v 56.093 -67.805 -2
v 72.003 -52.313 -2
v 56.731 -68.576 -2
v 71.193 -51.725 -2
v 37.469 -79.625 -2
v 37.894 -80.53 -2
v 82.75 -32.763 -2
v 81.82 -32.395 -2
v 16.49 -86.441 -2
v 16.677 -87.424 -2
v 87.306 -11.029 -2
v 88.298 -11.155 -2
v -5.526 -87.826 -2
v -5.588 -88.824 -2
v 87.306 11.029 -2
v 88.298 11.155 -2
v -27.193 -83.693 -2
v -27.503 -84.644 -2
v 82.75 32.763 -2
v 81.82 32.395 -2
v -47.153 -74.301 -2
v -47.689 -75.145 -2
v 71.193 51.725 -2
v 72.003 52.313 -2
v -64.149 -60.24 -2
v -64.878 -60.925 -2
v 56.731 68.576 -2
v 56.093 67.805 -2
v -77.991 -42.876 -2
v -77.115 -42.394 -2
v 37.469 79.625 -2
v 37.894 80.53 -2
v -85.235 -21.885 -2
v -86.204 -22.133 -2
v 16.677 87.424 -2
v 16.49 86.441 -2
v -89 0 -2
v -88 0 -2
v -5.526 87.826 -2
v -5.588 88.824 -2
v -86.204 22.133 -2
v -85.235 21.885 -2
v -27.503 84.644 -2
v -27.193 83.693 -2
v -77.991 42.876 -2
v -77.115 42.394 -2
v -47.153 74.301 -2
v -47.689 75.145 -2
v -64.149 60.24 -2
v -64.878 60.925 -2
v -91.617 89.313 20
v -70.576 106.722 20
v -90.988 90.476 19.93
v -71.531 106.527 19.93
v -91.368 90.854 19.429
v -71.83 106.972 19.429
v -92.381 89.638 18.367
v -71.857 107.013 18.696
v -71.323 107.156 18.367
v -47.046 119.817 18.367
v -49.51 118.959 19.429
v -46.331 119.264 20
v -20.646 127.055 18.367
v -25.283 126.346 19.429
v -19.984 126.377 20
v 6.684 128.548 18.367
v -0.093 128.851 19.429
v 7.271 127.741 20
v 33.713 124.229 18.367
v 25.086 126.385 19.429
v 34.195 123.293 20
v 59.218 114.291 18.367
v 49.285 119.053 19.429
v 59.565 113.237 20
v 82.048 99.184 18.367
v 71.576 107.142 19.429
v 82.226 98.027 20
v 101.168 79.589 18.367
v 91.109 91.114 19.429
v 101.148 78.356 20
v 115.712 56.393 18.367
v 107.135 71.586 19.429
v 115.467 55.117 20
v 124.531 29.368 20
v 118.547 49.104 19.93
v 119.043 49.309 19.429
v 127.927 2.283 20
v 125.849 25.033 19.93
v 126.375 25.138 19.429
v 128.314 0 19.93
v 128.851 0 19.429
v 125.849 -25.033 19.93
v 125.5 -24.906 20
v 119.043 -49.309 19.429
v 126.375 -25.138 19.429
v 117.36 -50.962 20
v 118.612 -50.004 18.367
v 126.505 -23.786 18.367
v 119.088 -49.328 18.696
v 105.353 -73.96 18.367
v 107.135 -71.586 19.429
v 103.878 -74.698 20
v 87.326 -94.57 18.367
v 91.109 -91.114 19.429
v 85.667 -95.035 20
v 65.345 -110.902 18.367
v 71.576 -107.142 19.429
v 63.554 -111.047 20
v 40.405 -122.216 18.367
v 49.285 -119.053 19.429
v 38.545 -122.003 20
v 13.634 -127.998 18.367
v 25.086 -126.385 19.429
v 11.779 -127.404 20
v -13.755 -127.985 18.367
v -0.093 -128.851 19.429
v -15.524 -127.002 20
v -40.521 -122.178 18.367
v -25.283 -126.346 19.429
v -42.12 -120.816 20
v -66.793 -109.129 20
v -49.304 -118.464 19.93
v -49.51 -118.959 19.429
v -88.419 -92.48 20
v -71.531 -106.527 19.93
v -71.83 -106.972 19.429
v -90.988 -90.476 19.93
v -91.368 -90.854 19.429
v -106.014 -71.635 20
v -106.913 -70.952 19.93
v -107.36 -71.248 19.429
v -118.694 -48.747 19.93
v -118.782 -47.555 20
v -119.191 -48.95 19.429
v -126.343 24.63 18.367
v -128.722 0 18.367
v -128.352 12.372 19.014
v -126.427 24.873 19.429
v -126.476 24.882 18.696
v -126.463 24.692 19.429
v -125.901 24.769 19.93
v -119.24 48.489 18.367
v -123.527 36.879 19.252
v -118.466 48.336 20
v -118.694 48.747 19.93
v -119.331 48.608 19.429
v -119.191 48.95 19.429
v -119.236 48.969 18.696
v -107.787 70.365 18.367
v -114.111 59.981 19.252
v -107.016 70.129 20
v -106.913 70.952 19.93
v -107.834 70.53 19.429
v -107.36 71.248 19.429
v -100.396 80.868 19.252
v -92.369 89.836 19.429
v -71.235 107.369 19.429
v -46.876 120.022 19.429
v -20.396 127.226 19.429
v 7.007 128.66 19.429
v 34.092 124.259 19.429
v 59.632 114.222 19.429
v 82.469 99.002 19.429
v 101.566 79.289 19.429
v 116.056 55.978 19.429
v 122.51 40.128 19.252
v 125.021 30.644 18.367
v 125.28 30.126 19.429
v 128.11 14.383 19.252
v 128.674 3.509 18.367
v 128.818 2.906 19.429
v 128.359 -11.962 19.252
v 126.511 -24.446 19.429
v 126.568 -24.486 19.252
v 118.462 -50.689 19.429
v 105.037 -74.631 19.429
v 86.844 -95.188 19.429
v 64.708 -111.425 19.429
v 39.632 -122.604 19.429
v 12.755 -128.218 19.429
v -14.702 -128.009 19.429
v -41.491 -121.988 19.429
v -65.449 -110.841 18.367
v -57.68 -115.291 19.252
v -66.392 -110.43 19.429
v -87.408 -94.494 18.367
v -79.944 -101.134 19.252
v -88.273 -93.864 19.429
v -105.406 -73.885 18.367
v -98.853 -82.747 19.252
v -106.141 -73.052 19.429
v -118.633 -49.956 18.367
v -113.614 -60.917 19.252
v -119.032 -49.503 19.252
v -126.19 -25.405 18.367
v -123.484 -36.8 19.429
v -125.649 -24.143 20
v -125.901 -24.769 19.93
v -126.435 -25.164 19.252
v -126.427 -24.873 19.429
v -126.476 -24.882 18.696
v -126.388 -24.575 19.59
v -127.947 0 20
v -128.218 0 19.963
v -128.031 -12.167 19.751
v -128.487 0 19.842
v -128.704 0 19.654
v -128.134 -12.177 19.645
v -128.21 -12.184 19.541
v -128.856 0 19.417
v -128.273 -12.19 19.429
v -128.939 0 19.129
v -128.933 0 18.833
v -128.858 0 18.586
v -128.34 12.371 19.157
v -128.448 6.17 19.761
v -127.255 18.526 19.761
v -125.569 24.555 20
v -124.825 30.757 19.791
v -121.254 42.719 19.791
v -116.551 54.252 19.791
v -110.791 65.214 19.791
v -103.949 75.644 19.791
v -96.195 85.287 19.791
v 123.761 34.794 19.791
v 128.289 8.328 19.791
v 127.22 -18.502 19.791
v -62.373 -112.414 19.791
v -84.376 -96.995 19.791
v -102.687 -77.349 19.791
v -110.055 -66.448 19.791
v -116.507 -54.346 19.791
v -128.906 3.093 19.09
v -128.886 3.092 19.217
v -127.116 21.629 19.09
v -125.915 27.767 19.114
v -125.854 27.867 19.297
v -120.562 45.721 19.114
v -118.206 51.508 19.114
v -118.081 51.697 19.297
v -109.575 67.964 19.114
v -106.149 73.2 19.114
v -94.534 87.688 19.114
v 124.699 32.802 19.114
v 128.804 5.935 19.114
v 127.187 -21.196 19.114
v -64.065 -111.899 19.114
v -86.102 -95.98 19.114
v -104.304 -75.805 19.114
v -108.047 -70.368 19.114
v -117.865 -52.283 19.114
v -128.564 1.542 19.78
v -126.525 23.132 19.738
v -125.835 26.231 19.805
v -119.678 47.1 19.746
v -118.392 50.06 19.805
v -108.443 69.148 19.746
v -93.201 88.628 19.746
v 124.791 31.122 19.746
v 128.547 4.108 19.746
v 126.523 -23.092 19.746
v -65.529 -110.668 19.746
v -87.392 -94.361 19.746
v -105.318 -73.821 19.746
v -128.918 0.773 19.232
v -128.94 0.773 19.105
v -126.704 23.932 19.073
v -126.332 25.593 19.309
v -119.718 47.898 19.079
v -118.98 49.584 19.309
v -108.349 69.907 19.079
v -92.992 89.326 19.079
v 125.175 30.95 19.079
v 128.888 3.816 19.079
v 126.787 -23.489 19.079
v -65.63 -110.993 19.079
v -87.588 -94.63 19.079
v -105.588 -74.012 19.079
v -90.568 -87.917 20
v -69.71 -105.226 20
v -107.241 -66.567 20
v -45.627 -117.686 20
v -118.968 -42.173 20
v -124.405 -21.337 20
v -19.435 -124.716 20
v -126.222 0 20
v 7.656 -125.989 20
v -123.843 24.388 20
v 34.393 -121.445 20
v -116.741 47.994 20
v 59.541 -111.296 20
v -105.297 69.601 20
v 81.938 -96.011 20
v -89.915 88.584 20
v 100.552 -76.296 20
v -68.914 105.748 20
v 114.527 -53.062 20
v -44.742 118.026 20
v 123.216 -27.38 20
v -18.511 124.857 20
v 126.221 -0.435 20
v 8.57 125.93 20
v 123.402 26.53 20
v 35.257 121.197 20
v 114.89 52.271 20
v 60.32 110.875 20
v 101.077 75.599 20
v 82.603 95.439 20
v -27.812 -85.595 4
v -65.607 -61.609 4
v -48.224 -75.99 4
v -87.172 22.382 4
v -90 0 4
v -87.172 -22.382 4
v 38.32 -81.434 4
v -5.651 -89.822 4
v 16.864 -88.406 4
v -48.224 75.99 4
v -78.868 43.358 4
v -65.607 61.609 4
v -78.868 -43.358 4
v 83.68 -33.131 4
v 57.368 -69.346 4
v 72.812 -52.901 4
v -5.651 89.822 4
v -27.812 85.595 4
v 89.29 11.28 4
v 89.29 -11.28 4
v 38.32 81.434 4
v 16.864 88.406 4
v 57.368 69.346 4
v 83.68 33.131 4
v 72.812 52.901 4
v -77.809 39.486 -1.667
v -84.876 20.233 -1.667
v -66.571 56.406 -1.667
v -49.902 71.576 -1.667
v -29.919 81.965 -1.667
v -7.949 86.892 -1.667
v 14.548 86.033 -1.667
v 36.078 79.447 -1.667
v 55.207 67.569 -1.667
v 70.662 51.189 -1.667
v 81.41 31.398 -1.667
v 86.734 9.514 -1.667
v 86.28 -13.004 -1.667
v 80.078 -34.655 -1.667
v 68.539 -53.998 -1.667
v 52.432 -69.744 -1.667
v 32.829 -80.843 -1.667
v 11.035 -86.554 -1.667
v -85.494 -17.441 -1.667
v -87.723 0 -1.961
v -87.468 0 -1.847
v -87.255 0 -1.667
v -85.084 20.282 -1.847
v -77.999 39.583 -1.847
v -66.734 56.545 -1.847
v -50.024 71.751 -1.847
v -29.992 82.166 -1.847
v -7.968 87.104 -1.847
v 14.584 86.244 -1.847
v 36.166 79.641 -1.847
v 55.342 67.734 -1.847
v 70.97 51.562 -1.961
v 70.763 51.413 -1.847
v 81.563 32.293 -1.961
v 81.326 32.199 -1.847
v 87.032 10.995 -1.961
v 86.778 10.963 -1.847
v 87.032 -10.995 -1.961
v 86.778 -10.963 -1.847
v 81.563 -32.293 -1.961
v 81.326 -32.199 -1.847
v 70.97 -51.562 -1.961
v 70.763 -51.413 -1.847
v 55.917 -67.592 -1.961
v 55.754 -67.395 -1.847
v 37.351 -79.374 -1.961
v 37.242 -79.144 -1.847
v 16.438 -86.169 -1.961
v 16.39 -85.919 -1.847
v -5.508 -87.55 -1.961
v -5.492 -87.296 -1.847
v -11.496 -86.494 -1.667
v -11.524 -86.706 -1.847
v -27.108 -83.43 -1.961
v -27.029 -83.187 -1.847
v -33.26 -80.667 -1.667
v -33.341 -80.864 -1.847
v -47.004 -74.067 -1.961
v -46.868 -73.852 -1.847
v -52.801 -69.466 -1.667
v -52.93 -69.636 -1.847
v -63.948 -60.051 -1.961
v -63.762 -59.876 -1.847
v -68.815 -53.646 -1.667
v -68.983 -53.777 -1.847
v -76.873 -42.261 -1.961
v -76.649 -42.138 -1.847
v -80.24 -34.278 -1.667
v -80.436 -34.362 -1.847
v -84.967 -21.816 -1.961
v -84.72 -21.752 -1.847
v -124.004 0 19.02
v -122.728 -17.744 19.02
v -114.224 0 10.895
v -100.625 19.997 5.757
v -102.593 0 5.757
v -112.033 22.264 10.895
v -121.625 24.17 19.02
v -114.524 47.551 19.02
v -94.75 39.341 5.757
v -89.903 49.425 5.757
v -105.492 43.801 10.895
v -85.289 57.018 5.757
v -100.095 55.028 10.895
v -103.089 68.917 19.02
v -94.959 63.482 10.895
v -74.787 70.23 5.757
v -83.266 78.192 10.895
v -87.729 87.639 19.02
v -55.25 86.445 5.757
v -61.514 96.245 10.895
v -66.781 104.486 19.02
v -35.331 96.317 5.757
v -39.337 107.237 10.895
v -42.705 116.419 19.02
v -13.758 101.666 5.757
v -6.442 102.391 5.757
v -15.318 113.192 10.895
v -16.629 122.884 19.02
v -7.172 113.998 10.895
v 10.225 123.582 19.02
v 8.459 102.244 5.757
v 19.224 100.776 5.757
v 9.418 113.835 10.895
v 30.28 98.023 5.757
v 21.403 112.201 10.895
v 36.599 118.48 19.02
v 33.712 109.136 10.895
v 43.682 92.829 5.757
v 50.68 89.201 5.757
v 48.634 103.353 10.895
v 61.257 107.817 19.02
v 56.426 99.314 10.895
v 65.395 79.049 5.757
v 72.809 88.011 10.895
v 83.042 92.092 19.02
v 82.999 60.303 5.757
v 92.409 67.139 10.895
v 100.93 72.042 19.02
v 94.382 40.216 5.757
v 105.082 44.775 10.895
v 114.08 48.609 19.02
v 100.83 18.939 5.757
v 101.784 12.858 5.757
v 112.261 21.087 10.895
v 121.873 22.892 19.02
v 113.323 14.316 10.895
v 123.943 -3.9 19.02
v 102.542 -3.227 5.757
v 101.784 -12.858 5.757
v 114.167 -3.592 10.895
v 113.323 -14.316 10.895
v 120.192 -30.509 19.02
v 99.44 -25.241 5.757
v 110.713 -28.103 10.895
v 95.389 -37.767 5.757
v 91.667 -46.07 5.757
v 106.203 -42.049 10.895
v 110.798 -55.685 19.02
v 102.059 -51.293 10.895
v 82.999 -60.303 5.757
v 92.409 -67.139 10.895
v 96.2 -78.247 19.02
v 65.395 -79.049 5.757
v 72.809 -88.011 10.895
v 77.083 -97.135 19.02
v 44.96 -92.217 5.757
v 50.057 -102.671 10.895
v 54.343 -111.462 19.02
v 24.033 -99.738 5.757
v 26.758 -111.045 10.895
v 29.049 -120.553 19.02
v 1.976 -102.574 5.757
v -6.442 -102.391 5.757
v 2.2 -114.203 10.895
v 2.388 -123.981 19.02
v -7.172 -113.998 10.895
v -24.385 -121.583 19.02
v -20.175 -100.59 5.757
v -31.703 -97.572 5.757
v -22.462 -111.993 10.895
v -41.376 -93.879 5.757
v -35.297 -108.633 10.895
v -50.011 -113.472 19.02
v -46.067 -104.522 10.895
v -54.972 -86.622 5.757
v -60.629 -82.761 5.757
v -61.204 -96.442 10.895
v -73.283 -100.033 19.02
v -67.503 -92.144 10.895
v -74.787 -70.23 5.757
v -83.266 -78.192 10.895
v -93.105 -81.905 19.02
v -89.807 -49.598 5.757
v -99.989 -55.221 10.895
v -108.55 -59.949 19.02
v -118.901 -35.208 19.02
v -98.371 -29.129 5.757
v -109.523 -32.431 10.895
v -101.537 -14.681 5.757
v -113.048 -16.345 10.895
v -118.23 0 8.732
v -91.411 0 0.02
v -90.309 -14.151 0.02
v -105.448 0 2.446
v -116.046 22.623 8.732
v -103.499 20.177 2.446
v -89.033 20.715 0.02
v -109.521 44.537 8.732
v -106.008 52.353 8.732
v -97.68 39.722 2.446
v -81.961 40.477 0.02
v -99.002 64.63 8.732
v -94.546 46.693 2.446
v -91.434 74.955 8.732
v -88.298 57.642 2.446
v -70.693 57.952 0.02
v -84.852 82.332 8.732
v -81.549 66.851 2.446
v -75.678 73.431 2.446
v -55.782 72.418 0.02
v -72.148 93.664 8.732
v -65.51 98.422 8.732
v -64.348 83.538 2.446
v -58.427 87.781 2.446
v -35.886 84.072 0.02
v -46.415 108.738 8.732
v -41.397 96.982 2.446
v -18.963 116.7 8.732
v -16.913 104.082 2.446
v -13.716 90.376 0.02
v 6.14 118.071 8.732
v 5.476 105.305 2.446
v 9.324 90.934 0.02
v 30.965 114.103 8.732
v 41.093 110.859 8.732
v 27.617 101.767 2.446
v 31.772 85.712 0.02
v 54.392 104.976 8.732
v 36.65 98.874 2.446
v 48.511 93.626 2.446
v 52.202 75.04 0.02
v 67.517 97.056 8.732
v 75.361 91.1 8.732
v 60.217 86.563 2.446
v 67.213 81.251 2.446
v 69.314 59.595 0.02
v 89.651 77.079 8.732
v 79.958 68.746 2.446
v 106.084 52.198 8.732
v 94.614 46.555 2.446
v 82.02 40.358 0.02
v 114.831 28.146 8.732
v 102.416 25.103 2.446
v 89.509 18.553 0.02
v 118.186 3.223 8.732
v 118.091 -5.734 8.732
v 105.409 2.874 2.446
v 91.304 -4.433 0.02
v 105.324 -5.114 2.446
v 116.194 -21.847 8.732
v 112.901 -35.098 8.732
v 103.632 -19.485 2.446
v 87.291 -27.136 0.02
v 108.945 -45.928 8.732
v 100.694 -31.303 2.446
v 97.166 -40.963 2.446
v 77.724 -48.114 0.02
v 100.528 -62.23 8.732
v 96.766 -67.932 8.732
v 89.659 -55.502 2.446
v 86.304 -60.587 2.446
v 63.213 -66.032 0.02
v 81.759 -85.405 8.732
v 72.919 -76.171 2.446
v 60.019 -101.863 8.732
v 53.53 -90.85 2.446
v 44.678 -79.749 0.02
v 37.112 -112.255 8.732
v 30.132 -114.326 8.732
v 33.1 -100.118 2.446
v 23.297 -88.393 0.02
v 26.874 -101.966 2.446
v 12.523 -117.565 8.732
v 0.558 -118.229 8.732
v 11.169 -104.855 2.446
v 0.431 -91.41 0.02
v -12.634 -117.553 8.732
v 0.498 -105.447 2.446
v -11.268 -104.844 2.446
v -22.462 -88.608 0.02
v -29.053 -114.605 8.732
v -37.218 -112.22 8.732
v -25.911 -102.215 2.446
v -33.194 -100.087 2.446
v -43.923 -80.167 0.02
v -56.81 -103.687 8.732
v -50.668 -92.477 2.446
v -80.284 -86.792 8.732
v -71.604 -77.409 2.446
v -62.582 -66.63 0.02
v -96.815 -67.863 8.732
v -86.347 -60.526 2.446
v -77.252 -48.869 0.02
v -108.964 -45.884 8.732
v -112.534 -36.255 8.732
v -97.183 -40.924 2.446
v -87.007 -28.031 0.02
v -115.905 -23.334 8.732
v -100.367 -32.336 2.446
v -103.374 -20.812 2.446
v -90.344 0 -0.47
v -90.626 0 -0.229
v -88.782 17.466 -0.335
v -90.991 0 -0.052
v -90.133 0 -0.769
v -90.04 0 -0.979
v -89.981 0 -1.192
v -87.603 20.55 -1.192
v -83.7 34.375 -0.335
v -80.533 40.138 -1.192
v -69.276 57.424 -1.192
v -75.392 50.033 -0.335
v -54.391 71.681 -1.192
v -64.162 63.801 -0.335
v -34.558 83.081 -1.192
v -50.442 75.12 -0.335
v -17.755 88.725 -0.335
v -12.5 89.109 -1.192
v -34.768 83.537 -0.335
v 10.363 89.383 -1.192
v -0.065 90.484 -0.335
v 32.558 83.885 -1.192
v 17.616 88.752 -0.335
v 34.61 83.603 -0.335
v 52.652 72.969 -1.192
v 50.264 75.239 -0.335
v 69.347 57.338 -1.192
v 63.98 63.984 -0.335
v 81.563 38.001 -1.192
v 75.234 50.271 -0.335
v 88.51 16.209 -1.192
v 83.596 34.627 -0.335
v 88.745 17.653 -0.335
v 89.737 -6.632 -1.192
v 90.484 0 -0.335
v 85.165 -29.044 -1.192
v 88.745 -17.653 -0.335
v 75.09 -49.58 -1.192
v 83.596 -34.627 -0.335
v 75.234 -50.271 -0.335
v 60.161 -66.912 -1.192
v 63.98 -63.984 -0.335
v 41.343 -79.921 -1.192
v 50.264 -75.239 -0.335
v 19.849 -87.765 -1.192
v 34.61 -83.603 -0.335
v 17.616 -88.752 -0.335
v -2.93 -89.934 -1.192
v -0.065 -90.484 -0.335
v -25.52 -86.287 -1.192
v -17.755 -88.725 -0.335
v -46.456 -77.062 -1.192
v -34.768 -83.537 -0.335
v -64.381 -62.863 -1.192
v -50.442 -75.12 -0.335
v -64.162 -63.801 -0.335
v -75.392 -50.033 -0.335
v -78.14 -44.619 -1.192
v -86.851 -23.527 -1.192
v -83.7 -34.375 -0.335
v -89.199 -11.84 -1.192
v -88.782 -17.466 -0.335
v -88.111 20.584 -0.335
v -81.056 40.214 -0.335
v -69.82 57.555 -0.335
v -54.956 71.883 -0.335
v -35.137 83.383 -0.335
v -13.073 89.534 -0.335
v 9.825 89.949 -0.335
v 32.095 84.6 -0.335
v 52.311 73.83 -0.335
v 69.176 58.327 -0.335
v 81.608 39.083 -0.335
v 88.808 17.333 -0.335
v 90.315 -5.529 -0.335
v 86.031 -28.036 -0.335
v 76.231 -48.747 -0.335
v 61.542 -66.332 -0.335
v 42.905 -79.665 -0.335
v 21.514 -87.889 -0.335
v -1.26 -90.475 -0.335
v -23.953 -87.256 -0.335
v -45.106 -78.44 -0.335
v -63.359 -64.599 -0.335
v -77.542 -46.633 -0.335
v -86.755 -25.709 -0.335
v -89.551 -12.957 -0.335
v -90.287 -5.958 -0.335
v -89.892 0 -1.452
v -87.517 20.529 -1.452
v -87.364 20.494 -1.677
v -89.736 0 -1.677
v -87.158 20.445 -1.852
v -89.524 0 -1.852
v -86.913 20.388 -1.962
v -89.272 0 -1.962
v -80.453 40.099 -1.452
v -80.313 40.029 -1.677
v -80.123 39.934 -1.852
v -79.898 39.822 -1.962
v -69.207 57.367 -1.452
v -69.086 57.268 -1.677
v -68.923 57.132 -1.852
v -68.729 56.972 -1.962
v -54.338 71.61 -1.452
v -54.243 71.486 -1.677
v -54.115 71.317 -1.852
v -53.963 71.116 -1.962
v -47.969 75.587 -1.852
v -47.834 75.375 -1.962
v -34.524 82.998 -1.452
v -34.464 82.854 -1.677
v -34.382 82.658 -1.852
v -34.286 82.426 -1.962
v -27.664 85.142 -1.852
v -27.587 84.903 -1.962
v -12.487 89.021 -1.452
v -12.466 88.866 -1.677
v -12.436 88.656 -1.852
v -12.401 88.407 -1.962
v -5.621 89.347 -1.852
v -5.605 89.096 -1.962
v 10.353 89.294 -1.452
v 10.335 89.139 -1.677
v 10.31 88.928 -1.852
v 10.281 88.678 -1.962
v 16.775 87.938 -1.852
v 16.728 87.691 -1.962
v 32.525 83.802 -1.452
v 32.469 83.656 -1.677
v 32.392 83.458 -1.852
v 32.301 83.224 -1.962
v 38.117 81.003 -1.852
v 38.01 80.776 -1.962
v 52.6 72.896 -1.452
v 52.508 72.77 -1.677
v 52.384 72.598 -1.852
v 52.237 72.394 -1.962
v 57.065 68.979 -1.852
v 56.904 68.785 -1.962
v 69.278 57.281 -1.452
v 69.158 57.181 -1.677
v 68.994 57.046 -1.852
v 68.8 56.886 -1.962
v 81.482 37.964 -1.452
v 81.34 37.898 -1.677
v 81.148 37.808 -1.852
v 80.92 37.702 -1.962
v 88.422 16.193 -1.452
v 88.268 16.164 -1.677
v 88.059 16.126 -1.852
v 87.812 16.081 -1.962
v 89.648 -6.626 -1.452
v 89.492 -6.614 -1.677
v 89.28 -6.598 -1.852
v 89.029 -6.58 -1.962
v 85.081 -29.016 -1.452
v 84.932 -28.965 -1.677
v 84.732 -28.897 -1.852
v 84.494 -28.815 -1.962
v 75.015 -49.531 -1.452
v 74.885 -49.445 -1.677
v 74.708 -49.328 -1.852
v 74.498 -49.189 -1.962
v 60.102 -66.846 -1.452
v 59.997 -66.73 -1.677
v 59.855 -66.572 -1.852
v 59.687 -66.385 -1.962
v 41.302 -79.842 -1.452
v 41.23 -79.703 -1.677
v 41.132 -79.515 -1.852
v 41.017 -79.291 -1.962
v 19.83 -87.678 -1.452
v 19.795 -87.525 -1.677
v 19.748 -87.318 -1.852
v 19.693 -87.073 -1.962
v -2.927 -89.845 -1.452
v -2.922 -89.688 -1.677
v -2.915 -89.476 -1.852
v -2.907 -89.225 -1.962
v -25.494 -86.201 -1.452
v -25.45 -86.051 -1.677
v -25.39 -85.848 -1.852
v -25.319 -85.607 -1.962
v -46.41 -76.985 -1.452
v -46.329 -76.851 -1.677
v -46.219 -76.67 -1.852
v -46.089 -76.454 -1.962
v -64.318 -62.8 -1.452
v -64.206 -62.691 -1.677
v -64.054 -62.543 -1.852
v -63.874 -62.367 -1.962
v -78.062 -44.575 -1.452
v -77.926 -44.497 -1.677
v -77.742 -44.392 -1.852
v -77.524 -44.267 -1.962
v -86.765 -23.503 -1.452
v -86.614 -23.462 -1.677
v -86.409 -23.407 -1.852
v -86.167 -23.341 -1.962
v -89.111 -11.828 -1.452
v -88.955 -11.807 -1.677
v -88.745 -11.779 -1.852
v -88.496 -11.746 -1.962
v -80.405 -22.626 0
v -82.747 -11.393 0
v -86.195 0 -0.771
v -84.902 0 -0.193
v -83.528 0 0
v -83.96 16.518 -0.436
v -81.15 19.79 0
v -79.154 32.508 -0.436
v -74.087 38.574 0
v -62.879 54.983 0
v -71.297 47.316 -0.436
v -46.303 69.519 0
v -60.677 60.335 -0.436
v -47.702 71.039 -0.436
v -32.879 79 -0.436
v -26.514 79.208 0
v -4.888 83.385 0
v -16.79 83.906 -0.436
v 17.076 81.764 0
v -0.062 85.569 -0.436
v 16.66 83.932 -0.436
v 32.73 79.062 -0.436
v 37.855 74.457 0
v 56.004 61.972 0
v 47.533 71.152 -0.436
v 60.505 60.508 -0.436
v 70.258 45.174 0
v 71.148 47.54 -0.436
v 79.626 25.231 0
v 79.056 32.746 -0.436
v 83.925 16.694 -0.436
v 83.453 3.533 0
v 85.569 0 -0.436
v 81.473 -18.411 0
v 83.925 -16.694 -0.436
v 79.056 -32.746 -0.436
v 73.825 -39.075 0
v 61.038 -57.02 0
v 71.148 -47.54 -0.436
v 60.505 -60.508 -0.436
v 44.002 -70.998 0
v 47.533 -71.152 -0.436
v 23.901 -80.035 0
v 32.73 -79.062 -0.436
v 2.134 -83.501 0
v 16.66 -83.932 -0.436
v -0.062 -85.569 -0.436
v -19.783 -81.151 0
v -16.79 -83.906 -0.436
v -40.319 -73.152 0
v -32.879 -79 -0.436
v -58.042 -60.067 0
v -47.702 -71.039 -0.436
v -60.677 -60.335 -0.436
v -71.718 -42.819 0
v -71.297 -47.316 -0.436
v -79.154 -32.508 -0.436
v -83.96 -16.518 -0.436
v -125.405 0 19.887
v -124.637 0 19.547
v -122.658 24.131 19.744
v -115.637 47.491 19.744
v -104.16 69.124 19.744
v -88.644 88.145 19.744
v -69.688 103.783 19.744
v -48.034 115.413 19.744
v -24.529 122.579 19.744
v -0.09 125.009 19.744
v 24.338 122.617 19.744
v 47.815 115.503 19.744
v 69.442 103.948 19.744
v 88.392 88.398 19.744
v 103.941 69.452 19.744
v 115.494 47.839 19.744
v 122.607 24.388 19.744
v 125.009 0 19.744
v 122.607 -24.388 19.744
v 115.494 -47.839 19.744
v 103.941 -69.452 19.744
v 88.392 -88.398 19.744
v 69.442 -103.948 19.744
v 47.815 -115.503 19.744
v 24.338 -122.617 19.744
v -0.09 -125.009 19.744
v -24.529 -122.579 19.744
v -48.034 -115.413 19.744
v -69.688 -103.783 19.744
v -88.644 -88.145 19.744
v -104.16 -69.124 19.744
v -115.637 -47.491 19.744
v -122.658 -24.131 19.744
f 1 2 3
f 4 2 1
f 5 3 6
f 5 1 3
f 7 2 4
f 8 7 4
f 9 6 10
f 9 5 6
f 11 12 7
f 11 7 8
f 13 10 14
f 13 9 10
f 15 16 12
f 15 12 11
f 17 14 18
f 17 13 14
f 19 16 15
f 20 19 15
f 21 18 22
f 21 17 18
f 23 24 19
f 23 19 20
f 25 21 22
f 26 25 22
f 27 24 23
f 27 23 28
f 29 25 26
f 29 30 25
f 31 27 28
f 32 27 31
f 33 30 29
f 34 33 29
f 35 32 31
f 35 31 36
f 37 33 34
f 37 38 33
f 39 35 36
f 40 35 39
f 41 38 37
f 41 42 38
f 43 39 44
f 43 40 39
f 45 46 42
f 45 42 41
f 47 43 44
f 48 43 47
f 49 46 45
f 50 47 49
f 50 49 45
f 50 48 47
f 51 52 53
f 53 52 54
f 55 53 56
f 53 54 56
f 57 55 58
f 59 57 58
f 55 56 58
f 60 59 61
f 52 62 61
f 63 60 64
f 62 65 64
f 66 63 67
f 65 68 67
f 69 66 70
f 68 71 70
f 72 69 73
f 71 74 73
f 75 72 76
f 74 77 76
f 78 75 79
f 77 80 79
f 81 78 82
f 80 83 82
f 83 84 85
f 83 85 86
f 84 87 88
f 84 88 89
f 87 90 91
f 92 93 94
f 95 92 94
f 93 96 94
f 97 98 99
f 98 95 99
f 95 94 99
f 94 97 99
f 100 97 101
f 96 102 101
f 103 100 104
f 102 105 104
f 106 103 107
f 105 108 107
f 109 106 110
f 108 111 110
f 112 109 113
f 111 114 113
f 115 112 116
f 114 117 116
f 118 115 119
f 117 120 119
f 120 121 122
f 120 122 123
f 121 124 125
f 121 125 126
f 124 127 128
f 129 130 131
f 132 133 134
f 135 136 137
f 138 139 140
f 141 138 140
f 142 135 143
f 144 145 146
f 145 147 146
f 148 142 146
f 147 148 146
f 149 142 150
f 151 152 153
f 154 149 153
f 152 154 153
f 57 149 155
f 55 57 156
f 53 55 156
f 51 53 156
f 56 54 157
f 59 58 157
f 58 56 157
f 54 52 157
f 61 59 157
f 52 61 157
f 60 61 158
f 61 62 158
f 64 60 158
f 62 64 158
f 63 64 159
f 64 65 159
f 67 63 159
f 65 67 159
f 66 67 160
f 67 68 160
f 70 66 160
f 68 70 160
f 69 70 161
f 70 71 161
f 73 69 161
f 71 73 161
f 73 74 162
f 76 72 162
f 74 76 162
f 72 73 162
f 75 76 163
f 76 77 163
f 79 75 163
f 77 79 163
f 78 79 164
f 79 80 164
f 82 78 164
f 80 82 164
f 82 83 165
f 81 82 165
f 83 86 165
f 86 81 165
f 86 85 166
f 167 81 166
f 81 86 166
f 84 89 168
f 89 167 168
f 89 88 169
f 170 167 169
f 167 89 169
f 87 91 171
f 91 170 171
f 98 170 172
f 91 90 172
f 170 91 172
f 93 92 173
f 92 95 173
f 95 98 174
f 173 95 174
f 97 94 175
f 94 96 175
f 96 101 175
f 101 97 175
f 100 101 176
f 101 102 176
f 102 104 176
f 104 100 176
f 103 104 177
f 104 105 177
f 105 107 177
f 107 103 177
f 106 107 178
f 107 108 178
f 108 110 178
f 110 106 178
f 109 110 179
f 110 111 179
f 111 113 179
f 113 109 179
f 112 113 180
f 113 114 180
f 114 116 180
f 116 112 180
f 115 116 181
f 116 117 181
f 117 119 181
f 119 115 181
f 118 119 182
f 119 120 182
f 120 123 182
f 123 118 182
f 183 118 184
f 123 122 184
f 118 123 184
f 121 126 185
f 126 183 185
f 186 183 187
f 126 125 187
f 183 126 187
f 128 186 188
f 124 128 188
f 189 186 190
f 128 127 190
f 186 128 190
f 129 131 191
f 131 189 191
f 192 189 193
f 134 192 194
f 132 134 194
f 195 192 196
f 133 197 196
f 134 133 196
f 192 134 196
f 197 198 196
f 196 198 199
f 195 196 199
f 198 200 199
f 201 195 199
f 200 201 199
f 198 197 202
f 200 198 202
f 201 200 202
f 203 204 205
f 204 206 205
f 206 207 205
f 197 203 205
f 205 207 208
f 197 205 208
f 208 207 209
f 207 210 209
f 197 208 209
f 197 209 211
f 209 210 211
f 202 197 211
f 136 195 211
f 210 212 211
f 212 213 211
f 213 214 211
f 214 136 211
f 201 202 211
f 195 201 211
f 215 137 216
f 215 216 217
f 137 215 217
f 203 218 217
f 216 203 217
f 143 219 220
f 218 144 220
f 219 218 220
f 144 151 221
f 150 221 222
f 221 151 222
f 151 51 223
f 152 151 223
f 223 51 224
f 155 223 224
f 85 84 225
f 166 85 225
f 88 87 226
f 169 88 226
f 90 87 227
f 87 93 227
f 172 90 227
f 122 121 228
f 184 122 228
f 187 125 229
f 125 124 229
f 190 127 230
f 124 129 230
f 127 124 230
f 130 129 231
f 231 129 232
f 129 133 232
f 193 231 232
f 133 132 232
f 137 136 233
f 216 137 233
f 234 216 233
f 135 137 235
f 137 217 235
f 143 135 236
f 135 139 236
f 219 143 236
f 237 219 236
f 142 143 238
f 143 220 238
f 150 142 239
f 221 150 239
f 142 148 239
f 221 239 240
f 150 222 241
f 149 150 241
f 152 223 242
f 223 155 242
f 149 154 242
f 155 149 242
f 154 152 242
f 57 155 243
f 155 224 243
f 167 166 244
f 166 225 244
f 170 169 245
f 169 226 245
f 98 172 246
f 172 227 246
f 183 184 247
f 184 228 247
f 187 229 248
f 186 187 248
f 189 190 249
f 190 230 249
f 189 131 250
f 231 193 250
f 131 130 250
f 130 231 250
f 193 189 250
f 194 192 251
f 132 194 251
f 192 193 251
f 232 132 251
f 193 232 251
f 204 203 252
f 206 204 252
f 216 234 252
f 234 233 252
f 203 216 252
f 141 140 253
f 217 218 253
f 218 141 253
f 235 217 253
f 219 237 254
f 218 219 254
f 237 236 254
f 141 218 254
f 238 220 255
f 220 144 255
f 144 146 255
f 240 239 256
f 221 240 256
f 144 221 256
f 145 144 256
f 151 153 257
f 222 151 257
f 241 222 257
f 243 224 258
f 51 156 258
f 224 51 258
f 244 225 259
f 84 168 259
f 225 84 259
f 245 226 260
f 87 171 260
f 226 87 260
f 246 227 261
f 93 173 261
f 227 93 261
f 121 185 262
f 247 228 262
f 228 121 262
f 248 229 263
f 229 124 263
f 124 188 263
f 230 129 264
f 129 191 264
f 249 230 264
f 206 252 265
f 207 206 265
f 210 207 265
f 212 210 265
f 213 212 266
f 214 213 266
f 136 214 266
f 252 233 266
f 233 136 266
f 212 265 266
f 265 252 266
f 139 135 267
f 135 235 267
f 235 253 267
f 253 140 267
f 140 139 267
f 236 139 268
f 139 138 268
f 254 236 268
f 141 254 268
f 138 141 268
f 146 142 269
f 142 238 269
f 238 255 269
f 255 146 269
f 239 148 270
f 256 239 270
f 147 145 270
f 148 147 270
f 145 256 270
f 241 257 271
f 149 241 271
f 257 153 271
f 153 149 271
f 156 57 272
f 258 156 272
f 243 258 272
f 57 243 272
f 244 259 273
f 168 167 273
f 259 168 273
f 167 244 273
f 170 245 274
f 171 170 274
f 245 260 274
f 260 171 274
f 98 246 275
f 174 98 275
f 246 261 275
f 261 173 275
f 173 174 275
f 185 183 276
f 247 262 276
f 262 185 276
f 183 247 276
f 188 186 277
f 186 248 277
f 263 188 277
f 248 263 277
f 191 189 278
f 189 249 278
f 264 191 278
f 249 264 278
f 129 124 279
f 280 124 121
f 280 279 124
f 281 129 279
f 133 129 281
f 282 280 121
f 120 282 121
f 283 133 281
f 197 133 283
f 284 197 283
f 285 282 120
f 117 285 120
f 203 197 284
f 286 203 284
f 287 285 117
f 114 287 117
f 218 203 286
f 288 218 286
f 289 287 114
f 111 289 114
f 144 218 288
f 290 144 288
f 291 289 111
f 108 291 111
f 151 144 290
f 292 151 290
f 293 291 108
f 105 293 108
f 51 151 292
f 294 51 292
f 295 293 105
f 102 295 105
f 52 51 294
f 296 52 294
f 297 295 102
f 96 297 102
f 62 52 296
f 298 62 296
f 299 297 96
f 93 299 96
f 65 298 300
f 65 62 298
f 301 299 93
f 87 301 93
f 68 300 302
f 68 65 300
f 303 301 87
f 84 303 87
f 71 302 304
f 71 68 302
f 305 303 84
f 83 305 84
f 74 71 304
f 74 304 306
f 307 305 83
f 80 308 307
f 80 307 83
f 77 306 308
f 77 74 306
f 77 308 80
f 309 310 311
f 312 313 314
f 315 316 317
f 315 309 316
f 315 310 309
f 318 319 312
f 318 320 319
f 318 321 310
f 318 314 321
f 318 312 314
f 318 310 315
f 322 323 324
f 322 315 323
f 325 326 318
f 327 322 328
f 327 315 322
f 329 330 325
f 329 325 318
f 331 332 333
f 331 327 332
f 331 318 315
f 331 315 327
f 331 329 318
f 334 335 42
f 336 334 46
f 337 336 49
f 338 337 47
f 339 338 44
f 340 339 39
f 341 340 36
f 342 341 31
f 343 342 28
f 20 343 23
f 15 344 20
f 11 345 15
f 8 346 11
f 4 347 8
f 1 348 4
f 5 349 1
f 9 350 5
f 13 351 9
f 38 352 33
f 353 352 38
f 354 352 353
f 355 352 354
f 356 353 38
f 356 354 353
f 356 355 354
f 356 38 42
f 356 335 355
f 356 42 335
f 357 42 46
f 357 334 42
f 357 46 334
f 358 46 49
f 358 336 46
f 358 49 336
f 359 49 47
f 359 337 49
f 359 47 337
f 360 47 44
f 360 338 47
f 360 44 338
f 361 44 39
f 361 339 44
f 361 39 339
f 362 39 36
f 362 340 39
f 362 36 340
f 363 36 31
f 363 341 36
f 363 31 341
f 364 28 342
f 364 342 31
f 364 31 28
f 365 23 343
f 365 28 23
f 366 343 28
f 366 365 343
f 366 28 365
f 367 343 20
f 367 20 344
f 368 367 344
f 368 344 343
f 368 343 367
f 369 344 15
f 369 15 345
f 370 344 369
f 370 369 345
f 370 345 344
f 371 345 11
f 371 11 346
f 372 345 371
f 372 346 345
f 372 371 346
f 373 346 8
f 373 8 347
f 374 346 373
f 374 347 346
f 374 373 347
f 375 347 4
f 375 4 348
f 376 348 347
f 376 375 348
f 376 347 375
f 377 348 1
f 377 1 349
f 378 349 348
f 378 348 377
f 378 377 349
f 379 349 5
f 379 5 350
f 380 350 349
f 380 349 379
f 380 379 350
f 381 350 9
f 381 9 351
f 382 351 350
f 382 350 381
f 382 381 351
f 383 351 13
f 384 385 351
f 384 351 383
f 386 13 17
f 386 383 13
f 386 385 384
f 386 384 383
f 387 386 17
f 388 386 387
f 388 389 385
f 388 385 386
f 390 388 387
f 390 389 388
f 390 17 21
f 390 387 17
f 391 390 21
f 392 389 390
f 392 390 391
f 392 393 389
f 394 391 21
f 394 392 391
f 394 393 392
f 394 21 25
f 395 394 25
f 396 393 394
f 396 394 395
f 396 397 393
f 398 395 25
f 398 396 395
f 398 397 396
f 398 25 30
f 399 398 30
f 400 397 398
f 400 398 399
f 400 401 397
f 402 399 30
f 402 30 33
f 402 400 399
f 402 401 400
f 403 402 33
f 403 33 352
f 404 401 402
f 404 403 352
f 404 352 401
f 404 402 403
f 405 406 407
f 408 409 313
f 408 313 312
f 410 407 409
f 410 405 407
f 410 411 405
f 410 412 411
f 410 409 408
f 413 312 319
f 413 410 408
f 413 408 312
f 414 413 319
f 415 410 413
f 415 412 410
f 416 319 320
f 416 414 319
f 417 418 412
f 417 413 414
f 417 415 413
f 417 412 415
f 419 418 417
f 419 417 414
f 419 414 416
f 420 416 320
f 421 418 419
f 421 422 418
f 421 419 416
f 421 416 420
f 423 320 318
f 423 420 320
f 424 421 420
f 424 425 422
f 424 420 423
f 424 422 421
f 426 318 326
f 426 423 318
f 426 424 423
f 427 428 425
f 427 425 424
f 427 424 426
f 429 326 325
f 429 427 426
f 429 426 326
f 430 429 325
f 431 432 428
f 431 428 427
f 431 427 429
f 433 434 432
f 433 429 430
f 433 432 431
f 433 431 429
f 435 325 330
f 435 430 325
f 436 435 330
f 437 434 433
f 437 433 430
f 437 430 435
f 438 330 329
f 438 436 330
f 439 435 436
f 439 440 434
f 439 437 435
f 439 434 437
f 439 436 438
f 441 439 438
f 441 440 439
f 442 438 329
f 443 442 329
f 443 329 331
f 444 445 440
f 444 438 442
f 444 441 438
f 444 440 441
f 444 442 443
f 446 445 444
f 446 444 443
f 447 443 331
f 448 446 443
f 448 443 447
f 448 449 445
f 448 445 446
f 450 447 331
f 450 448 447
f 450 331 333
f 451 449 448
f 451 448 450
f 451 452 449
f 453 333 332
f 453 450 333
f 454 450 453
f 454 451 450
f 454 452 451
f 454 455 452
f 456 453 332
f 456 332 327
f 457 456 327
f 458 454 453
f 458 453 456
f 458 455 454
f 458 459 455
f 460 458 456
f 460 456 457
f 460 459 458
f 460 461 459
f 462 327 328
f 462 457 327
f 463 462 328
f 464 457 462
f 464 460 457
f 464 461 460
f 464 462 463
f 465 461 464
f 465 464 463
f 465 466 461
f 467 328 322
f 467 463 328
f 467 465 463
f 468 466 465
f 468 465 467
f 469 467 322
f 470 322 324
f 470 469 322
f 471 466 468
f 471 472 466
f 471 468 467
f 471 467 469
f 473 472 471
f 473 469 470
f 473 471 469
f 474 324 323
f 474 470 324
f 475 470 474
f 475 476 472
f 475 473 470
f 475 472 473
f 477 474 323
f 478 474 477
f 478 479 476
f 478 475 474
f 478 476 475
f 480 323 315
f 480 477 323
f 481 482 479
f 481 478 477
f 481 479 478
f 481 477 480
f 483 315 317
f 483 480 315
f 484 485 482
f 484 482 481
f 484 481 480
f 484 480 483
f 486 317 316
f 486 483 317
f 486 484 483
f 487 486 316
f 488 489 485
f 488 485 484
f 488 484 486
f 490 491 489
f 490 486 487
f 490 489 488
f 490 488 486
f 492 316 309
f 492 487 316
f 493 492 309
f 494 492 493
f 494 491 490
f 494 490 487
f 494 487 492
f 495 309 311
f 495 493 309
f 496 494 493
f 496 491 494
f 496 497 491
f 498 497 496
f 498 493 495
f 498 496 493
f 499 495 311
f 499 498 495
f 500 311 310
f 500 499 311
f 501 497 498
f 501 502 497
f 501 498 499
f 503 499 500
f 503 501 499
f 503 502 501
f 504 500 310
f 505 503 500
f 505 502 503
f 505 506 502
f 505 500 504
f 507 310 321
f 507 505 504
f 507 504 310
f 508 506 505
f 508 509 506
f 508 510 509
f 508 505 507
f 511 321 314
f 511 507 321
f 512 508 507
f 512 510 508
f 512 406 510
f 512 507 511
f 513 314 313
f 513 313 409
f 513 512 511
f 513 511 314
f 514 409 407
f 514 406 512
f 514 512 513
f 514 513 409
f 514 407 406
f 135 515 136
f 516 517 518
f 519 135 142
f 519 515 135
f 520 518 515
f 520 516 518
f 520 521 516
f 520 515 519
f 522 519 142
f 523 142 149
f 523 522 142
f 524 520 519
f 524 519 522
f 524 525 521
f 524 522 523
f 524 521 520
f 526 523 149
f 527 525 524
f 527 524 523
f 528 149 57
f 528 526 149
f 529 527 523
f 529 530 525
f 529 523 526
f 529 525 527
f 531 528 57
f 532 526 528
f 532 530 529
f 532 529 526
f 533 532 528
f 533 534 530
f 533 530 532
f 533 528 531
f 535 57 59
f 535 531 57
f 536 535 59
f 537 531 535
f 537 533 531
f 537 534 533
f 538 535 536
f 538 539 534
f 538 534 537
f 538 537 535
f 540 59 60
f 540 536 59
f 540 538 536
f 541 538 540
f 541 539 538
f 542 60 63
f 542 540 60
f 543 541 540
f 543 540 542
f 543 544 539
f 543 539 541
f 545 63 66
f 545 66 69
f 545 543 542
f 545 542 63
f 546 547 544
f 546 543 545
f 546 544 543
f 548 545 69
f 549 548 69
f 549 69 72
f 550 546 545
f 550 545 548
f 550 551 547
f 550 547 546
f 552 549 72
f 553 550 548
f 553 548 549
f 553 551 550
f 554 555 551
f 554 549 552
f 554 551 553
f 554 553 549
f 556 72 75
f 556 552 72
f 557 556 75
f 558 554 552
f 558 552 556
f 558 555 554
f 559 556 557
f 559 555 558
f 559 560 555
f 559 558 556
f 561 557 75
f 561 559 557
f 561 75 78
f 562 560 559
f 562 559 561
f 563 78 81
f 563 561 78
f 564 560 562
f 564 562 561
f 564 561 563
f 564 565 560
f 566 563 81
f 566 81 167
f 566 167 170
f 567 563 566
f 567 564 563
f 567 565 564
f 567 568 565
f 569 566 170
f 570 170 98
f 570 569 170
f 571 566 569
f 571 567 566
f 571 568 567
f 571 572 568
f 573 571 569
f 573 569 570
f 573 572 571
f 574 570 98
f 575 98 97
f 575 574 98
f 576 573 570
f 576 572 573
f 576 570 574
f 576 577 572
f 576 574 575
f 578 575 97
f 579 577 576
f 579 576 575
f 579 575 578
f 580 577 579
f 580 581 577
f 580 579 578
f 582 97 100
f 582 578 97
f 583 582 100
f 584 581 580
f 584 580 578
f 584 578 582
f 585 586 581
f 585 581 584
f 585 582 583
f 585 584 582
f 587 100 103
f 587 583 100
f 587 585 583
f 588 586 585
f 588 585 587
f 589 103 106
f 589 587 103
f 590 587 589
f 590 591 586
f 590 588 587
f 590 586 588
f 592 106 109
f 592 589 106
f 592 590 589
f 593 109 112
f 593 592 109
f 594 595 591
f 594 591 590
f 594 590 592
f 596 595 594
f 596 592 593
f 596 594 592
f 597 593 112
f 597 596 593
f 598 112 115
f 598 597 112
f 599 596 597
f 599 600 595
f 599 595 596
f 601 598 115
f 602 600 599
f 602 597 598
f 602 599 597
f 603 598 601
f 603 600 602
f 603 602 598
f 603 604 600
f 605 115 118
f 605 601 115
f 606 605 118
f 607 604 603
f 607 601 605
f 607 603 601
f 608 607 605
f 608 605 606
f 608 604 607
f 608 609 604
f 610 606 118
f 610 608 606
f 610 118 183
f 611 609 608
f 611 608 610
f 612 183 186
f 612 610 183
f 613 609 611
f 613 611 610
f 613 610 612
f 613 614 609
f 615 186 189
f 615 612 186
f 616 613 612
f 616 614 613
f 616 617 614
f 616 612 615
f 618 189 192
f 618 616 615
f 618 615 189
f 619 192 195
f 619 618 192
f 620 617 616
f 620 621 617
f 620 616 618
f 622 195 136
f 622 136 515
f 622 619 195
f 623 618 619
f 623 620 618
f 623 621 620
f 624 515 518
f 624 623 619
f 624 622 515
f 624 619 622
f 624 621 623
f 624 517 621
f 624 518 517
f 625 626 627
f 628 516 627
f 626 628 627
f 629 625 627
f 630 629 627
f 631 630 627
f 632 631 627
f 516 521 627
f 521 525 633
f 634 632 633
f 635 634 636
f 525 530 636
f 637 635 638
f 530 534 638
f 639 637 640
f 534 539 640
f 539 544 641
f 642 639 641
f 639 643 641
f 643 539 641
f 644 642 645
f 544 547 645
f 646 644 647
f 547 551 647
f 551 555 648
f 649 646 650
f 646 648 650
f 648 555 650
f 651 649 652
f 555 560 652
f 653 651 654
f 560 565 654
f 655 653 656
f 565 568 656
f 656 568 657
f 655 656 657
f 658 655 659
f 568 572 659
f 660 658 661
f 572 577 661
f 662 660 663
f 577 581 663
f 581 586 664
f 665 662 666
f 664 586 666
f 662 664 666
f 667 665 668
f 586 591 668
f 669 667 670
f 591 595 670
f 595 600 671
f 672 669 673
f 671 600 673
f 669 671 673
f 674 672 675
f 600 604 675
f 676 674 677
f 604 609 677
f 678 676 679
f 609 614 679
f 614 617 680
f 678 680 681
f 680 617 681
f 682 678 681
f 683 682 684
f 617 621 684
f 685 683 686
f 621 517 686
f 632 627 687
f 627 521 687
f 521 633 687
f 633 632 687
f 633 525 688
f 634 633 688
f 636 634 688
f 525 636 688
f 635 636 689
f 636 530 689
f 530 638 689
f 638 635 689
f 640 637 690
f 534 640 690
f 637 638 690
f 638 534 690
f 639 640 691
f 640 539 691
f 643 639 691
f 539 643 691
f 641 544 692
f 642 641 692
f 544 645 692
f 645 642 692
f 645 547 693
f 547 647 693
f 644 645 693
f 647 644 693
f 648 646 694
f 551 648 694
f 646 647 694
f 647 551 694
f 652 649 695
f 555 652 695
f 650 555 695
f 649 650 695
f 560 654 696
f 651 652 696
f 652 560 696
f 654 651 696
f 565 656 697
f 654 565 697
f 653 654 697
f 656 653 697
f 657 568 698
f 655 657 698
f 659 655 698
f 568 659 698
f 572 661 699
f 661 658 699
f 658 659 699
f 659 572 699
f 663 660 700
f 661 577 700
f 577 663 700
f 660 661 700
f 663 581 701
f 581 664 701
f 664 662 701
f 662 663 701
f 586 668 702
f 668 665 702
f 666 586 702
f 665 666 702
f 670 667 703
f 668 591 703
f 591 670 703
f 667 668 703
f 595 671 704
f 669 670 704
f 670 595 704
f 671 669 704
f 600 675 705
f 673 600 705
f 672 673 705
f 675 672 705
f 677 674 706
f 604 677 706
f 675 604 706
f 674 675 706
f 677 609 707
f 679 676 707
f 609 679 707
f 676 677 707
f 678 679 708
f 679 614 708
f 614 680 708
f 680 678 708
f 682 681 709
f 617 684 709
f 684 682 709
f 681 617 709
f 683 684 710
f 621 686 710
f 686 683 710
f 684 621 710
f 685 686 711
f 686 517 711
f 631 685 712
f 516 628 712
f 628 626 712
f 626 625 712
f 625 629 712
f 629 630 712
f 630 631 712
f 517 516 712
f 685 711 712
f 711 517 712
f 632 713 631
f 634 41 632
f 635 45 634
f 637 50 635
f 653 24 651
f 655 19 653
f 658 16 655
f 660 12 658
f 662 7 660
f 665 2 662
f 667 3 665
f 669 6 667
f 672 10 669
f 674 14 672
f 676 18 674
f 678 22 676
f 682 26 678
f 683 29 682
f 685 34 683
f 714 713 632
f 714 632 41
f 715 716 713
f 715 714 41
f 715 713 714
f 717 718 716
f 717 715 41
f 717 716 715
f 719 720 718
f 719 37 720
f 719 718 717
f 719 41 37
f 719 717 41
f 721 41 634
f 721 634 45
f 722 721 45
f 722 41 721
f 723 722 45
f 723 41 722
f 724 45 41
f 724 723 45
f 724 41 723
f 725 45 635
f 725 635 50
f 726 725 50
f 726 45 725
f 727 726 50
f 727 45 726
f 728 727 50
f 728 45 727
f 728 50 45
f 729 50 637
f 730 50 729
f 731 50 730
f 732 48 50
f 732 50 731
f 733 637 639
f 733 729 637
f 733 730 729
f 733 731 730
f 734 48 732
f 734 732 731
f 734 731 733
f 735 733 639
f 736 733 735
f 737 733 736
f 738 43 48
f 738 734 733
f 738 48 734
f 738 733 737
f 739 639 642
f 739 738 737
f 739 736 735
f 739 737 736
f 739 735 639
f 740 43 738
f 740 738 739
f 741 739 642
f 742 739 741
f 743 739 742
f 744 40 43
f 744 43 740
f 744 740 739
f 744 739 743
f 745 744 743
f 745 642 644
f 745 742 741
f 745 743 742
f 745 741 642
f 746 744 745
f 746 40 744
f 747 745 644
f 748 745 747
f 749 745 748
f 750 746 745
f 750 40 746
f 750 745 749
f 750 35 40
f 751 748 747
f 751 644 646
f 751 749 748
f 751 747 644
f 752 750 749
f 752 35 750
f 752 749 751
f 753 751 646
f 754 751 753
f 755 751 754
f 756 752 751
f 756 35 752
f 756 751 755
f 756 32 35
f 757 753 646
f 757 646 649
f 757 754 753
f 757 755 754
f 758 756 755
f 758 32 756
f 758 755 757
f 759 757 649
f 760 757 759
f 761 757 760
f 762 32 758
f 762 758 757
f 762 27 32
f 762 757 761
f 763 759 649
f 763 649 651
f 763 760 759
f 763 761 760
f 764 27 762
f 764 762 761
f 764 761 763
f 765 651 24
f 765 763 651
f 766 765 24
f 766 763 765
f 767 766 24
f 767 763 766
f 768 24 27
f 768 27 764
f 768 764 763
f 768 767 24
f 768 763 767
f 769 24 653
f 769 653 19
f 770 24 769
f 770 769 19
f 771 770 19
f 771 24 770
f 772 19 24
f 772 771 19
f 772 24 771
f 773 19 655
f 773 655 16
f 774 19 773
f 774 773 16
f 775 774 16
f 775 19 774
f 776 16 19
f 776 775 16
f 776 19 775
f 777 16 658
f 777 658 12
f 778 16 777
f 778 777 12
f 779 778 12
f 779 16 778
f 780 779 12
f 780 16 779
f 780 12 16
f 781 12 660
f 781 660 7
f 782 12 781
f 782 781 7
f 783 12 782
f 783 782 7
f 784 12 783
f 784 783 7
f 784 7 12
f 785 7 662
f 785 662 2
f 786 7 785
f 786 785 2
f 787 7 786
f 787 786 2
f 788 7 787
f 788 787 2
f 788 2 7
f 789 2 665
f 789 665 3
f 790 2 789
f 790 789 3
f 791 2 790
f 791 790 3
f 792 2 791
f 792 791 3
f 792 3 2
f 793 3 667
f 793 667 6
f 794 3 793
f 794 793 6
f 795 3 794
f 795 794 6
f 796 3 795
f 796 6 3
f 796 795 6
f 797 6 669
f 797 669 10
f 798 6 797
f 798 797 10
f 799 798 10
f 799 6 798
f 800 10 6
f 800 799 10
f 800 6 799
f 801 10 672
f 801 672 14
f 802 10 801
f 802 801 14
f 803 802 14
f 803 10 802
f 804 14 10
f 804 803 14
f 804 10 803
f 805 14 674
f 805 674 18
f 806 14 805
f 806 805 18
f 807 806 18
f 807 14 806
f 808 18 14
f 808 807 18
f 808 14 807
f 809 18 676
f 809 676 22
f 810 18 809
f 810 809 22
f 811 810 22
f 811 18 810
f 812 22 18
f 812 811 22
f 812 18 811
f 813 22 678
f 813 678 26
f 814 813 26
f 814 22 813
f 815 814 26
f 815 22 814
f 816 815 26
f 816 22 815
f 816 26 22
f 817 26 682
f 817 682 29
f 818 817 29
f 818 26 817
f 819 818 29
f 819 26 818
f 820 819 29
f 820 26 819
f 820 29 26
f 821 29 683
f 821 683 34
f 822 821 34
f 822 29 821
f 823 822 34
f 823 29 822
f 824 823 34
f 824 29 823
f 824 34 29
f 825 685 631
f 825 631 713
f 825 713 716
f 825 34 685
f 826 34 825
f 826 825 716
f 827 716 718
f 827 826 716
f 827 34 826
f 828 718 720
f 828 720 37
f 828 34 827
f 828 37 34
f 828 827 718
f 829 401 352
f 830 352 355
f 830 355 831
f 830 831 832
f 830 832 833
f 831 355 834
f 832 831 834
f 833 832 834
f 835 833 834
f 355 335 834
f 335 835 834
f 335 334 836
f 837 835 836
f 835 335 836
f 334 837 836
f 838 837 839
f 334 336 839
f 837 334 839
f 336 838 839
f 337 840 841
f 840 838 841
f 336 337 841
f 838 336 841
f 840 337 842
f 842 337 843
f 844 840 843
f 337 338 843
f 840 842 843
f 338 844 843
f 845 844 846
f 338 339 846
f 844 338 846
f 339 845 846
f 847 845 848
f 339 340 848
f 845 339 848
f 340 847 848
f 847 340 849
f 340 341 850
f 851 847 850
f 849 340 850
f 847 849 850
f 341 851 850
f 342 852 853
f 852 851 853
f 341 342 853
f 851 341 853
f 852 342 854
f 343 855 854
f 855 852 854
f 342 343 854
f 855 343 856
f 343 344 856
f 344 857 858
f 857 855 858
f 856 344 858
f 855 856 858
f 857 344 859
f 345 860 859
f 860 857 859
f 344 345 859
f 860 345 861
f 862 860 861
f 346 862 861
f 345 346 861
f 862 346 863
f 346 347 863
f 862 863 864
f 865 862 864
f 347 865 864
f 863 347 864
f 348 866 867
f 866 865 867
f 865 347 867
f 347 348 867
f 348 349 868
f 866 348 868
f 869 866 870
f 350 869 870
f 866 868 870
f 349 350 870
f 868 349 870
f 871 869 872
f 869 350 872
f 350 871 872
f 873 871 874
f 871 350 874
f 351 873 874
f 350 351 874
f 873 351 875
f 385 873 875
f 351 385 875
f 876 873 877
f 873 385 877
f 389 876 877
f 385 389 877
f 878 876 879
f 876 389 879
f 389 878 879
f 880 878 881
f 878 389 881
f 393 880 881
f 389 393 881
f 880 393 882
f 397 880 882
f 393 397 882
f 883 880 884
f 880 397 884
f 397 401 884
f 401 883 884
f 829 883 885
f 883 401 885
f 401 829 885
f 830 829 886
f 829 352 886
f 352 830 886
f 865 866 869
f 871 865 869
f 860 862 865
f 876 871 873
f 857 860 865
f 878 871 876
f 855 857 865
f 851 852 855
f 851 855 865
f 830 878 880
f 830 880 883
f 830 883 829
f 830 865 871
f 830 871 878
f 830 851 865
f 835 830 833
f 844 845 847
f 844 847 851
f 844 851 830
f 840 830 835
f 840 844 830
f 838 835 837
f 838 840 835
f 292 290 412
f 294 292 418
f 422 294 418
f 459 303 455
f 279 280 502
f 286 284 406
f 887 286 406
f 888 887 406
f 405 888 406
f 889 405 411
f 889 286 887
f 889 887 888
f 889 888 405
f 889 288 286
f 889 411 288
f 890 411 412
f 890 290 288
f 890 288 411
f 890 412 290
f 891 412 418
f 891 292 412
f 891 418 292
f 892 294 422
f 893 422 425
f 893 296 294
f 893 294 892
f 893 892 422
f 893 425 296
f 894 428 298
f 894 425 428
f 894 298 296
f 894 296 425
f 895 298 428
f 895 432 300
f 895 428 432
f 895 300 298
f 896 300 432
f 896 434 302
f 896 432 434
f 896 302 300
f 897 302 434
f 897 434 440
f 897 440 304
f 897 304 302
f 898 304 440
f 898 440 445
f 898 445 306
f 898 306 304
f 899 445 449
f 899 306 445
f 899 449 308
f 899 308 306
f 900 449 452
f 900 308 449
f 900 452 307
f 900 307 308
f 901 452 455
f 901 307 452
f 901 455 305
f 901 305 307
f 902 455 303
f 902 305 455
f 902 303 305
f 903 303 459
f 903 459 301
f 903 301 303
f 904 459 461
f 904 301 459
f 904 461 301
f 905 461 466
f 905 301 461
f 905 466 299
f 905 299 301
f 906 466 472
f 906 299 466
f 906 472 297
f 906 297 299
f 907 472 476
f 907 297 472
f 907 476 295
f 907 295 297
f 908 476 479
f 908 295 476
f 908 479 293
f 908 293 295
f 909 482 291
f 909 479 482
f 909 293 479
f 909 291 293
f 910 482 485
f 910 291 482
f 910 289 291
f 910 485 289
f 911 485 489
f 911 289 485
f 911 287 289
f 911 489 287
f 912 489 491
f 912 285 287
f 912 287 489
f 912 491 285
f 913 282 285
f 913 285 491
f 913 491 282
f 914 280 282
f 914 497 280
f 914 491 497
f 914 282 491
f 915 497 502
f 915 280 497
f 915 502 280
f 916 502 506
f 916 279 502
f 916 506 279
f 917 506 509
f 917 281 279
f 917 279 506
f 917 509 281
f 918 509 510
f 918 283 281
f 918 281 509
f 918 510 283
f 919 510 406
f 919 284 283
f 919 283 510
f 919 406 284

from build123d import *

# Parameters (mm, degrees)
F0_W = 3
F0_H = 2
F2_R = 1
F3_R = 3
F4_R = 1.5
F5_R = 5


with BuildPart() as f1:
    # F0 (on Front) → F1 (revolve)
    with BuildSketch(Plane.XZ):
        with BuildLine():
            Line((-87, 0), (0, 0))
            Line((0, 0), (0, 4))
            Line((0, 4), (-90, 4))
            ThreePointArc((-90, 4), (-109.183326, 8.19091), (-124.871192, 20))
            Line((-124.871192, 20), (-130, 20))
            ThreePointArc((-130, 20), (-112.36068, 5.27864), (-90, 0))
            Line((-90, 0), (-87, 0))
        make_face()
        with Locations((-88.5, -1)):
            Rectangle(F0_W, F0_H)
    revolve(axis=Axis((0, 0, 2), (0, 0, -1)))

    # F2
    f2_edges = [f1.edges().sort_by_distance(p)[0] for p in [
        (130, 0, 20),
        (90, 0, -2),
        (87, 0, -2),
    ]]
    fillet(f2_edges, radius=F2_R)

    # F3
    f3_edges = [f1.edges().sort_by_distance(p)[0] for p in [
        (124.871192, 0, 20),
    ]]
    fillet(f3_edges, radius=F3_R)

    # F4
    f4_edges = [f1.edges().sort_by_distance(p)[0] for p in [
        (90, 0, 0),
    ]]
    fillet(f4_edges, radius=F4_R)

    # F5
    f5_edges = [f1.edges().sort_by_distance(p)[0] for p in [
        (87, 0, 0),
    ]]
    fillet(f5_edges, radius=F5_R)


solid = f1.part
